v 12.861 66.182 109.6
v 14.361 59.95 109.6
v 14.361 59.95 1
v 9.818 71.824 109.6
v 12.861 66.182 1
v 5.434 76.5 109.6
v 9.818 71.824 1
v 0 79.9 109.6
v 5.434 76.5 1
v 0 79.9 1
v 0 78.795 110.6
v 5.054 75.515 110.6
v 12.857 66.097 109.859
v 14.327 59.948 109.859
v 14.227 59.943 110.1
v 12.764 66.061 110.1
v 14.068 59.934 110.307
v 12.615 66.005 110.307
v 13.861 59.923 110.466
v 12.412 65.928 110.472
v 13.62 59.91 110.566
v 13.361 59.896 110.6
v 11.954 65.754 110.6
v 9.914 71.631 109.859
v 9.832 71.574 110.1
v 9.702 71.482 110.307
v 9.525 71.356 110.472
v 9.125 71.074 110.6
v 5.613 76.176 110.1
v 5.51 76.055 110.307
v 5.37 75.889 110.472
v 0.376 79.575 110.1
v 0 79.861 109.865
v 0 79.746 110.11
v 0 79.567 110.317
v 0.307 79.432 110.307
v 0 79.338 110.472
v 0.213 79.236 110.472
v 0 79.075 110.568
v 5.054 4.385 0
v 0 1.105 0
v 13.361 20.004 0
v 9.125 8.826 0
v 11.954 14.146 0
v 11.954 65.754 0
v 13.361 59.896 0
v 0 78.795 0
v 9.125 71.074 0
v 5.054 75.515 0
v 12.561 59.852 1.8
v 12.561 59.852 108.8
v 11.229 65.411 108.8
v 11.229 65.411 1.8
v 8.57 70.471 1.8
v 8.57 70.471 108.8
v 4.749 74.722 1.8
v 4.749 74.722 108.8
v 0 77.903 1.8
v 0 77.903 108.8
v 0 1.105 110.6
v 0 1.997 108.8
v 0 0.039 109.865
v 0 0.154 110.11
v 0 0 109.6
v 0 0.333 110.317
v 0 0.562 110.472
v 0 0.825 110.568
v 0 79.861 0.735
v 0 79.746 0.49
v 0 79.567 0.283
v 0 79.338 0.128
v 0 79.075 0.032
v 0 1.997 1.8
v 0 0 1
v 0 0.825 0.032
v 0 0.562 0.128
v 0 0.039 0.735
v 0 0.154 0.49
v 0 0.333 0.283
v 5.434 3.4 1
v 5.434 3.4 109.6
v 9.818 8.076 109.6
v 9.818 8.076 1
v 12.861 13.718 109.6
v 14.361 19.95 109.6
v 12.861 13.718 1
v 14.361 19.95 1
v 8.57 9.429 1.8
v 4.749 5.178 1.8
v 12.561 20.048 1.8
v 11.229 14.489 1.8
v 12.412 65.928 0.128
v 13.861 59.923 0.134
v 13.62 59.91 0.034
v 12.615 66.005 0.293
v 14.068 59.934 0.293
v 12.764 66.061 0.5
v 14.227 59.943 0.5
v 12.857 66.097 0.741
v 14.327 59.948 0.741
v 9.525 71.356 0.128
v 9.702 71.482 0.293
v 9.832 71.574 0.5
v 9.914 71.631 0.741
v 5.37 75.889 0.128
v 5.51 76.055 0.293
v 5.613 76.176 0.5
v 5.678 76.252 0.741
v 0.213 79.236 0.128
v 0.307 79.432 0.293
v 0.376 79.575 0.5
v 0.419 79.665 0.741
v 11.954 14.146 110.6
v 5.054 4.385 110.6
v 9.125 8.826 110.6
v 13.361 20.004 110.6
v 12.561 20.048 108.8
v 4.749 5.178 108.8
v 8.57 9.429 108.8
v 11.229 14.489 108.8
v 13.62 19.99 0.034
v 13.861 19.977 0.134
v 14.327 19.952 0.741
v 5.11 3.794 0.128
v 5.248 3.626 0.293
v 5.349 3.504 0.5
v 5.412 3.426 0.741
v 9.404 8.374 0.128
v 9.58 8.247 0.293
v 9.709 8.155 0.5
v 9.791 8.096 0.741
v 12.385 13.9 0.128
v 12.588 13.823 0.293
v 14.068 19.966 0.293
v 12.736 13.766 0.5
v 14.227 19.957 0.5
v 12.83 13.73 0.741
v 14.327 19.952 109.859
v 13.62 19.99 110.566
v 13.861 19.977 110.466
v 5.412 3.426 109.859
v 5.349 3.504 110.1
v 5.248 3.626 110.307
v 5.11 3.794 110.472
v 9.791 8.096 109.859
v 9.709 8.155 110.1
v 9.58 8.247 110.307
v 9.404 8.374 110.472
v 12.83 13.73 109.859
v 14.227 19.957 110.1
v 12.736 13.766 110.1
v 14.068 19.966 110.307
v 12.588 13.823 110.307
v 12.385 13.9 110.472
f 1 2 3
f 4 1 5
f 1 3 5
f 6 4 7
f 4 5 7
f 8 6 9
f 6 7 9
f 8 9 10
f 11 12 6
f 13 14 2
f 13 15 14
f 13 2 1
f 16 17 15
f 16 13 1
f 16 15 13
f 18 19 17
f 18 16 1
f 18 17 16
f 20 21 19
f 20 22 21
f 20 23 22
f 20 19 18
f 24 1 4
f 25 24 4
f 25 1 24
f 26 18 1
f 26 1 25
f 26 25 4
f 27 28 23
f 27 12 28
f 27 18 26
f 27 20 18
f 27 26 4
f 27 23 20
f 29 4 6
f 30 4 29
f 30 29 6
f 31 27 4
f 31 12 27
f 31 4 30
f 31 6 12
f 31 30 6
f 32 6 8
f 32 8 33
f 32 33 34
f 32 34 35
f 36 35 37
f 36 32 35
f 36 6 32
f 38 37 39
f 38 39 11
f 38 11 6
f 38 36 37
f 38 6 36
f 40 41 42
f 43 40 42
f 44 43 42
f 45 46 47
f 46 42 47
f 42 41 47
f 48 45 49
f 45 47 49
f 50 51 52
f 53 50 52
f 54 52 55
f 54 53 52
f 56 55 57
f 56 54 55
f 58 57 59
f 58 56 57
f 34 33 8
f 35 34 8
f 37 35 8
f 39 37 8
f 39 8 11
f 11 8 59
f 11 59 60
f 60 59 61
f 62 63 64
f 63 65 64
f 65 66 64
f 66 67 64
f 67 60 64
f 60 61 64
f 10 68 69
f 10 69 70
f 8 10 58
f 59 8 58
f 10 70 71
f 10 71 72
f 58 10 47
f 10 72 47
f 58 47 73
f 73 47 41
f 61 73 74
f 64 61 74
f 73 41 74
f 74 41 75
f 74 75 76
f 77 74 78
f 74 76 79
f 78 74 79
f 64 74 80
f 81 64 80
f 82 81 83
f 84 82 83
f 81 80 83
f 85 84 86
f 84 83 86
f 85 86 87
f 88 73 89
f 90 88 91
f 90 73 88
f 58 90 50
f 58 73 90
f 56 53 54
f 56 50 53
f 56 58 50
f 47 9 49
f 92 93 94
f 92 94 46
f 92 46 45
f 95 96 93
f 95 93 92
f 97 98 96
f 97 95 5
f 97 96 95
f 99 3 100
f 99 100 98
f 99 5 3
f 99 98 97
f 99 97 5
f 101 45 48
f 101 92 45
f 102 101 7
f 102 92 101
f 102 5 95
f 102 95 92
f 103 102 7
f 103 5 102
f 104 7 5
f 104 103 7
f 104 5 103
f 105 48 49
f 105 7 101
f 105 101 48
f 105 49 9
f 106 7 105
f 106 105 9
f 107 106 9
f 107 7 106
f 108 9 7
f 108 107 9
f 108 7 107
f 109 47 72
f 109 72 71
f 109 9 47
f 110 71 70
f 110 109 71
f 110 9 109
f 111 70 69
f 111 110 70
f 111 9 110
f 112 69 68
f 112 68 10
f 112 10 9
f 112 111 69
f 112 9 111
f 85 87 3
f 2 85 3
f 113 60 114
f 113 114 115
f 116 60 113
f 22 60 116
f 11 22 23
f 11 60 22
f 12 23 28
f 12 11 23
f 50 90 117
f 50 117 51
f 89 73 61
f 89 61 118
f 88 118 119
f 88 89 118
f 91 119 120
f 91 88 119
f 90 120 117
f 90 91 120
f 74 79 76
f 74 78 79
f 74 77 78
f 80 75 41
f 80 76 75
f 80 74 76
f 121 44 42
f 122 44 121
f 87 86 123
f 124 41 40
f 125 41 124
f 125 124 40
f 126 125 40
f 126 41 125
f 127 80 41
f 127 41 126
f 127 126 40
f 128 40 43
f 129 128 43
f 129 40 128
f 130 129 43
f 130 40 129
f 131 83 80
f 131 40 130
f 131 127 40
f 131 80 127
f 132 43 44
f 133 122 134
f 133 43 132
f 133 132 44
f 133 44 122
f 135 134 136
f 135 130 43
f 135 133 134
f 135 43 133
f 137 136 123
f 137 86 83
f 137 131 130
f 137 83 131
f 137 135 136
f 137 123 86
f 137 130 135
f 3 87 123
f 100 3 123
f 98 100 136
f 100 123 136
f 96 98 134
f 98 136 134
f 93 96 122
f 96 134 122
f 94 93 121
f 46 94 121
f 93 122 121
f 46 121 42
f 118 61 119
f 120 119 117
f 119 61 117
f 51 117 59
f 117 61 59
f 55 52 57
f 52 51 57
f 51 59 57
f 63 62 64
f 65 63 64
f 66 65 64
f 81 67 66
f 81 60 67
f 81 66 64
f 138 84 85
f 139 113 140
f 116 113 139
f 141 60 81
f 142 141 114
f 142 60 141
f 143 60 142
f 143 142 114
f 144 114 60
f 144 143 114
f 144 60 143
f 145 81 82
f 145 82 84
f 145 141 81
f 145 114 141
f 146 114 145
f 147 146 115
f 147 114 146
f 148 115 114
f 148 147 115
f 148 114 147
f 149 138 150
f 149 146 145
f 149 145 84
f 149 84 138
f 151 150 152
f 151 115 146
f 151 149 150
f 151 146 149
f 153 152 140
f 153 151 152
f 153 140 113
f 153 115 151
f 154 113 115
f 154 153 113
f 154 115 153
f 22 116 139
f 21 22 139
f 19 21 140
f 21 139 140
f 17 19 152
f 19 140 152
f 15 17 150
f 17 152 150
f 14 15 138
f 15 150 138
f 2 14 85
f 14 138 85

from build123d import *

# Parameters (mm, degrees)
MAIN_SHAPE_DEPTH = 110.6
HOLLOW_T         = -1.8
FILLETS_R        = 1


with BuildPart() as part:
    # Sketch for the main shape → Main shape (new body)
    with BuildSketch(Plane.XY):
        with BuildLine():
            Line((14.361069392, 19.95), (14.361069392, 59.95))
            ThreePointArc((14.361069392, 59.95), (9.818254591, 71.823770849), (0, 79.9))
            Line((0, 79.9), (0, 0))
            ThreePointArc((0, 0), (9.818254591, 8.076229151), (14.361069392, 19.95))
        make_face()
    extrude(amount=MAIN_SHAPE_DEPTH)

    # Hollow
    hollow_openings = [part.faces().sort_by_distance(p)[0] for p in [
        (0, 39.95, 55.3),
    ]]
    offset(amount=HOLLOW_T, openings=hollow_openings, kind=Kind.INTERSECTION)

    # Fillets
    # the kernel refuses this fillet: 1 mm, written as the material it takes off along each edge
    with BuildSketch(Plane(origin=(-10.361710586, 57.297160312, 110.6), x_dir=(0.9999799478441757, 0.006332764764284822, 0), z_dir=(0.006332764764284822, -0.9999799478441757, 0))) as fillets_piece_1:
        with BuildLine():
            CenterArc((24.864702054 - FILLETS_R, -FILLETS_R), FILLETS_R, 0, 90)
            Line((24.864702054 - FILLETS_R, 0), (24.864702054, 0))
            Line((24.864702054, 0), (24.864702054, -FILLETS_R))
        make_face()
    revolve(axis=Axis((-10.361710586, 57.297160312, 110.6), (0, 0, 1)), revolution_arc=70.771001335, mode=Mode.SUBTRACT)
    with BuildSketch(Plane(origin=(-10.361710586, 22.602839688, 110.6), x_dir=(0.32335851179223435, -0.9462765308573977, 0), z_dir=(-0.9462765308573977, -0.32335851179223435, 0))) as fillets_piece_2:
        with BuildLine():
            CenterArc((24.864702054 - FILLETS_R, -FILLETS_R), FILLETS_R, 0, 90)
            Line((24.864702054 - FILLETS_R, 0), (24.864702054, 0))
            Line((24.864702054, 0), (24.864702054, -FILLETS_R))
        make_face()
    revolve(axis=Axis((-10.361710586, 22.602839688, 110.6), (0, 0, 1)), revolution_arc=70.771001335, mode=Mode.SUBTRACT)
    with BuildSketch(Plane(origin=(-10.361710586, 57.297160312, 0), x_dir=(0.9999799478441757, 0.006332764764284822, 0), z_dir=(0.006332764764284822, -0.9999799478441757, 0))) as fillets_piece_3:
        with BuildLine():
            CenterArc((24.864702054 - FILLETS_R, FILLETS_R), FILLETS_R, 270, 90)
            Line((24.864702054 - FILLETS_R, 0), (24.864702054, 0))
            Line((24.864702054, 0), (24.864702054, FILLETS_R))
        make_face()
    revolve(axis=Axis((-10.361710586, 57.297160312, 0), (0, 0, 1)), revolution_arc=70.771001335, mode=Mode.SUBTRACT)
    with BuildSketch(Plane(origin=(14.361069392, 17.45, 0), x_dir=(0, 0, 1), z_dir=(0, 1, 0))) as fillets_piece_4:
        with BuildLine():
            CenterArc((FILLETS_R, -FILLETS_R), FILLETS_R, 90, 90)
            Line((0, -FILLETS_R), (0, 0))
            Line((0, 0), (FILLETS_R, 0))
        make_face()
    extrude(amount=45, mode=Mode.SUBTRACT)
    with BuildSketch(Plane(origin=(-10.361710586, 22.602839688, 0), x_dir=(0.32335851179223435, -0.9462765308573977, 0), z_dir=(-0.9462765308573977, -0.32335851179223435, 0))) as fillets_piece_5:
        with BuildLine():
            CenterArc((24.864702054 - FILLETS_R, FILLETS_R), FILLETS_R, 270, 90)
            Line((24.864702054 - FILLETS_R, 0), (24.864702054, 0))
            Line((24.864702054, 0), (24.864702054, FILLETS_R))
        make_face()
    revolve(axis=Axis((-10.361710586, 22.602839688, 0), (0, 0, 1)), revolution_arc=70.771001335, mode=Mode.SUBTRACT)
    with BuildSketch(Plane(origin=(14.361069392, 17.45, 110.6), x_dir=(0, 0, -1), z_dir=(0, 1, 0))) as fillets_piece_6:
        with BuildLine():
            CenterArc((FILLETS_R, FILLETS_R), FILLETS_R, 180, 90)
            Line((0, FILLETS_R), (0, 0))
            Line((0, 0), (FILLETS_R, 0))
        make_face()
    extrude(amount=45, mode=Mode.SUBTRACT)


solid = part.part
